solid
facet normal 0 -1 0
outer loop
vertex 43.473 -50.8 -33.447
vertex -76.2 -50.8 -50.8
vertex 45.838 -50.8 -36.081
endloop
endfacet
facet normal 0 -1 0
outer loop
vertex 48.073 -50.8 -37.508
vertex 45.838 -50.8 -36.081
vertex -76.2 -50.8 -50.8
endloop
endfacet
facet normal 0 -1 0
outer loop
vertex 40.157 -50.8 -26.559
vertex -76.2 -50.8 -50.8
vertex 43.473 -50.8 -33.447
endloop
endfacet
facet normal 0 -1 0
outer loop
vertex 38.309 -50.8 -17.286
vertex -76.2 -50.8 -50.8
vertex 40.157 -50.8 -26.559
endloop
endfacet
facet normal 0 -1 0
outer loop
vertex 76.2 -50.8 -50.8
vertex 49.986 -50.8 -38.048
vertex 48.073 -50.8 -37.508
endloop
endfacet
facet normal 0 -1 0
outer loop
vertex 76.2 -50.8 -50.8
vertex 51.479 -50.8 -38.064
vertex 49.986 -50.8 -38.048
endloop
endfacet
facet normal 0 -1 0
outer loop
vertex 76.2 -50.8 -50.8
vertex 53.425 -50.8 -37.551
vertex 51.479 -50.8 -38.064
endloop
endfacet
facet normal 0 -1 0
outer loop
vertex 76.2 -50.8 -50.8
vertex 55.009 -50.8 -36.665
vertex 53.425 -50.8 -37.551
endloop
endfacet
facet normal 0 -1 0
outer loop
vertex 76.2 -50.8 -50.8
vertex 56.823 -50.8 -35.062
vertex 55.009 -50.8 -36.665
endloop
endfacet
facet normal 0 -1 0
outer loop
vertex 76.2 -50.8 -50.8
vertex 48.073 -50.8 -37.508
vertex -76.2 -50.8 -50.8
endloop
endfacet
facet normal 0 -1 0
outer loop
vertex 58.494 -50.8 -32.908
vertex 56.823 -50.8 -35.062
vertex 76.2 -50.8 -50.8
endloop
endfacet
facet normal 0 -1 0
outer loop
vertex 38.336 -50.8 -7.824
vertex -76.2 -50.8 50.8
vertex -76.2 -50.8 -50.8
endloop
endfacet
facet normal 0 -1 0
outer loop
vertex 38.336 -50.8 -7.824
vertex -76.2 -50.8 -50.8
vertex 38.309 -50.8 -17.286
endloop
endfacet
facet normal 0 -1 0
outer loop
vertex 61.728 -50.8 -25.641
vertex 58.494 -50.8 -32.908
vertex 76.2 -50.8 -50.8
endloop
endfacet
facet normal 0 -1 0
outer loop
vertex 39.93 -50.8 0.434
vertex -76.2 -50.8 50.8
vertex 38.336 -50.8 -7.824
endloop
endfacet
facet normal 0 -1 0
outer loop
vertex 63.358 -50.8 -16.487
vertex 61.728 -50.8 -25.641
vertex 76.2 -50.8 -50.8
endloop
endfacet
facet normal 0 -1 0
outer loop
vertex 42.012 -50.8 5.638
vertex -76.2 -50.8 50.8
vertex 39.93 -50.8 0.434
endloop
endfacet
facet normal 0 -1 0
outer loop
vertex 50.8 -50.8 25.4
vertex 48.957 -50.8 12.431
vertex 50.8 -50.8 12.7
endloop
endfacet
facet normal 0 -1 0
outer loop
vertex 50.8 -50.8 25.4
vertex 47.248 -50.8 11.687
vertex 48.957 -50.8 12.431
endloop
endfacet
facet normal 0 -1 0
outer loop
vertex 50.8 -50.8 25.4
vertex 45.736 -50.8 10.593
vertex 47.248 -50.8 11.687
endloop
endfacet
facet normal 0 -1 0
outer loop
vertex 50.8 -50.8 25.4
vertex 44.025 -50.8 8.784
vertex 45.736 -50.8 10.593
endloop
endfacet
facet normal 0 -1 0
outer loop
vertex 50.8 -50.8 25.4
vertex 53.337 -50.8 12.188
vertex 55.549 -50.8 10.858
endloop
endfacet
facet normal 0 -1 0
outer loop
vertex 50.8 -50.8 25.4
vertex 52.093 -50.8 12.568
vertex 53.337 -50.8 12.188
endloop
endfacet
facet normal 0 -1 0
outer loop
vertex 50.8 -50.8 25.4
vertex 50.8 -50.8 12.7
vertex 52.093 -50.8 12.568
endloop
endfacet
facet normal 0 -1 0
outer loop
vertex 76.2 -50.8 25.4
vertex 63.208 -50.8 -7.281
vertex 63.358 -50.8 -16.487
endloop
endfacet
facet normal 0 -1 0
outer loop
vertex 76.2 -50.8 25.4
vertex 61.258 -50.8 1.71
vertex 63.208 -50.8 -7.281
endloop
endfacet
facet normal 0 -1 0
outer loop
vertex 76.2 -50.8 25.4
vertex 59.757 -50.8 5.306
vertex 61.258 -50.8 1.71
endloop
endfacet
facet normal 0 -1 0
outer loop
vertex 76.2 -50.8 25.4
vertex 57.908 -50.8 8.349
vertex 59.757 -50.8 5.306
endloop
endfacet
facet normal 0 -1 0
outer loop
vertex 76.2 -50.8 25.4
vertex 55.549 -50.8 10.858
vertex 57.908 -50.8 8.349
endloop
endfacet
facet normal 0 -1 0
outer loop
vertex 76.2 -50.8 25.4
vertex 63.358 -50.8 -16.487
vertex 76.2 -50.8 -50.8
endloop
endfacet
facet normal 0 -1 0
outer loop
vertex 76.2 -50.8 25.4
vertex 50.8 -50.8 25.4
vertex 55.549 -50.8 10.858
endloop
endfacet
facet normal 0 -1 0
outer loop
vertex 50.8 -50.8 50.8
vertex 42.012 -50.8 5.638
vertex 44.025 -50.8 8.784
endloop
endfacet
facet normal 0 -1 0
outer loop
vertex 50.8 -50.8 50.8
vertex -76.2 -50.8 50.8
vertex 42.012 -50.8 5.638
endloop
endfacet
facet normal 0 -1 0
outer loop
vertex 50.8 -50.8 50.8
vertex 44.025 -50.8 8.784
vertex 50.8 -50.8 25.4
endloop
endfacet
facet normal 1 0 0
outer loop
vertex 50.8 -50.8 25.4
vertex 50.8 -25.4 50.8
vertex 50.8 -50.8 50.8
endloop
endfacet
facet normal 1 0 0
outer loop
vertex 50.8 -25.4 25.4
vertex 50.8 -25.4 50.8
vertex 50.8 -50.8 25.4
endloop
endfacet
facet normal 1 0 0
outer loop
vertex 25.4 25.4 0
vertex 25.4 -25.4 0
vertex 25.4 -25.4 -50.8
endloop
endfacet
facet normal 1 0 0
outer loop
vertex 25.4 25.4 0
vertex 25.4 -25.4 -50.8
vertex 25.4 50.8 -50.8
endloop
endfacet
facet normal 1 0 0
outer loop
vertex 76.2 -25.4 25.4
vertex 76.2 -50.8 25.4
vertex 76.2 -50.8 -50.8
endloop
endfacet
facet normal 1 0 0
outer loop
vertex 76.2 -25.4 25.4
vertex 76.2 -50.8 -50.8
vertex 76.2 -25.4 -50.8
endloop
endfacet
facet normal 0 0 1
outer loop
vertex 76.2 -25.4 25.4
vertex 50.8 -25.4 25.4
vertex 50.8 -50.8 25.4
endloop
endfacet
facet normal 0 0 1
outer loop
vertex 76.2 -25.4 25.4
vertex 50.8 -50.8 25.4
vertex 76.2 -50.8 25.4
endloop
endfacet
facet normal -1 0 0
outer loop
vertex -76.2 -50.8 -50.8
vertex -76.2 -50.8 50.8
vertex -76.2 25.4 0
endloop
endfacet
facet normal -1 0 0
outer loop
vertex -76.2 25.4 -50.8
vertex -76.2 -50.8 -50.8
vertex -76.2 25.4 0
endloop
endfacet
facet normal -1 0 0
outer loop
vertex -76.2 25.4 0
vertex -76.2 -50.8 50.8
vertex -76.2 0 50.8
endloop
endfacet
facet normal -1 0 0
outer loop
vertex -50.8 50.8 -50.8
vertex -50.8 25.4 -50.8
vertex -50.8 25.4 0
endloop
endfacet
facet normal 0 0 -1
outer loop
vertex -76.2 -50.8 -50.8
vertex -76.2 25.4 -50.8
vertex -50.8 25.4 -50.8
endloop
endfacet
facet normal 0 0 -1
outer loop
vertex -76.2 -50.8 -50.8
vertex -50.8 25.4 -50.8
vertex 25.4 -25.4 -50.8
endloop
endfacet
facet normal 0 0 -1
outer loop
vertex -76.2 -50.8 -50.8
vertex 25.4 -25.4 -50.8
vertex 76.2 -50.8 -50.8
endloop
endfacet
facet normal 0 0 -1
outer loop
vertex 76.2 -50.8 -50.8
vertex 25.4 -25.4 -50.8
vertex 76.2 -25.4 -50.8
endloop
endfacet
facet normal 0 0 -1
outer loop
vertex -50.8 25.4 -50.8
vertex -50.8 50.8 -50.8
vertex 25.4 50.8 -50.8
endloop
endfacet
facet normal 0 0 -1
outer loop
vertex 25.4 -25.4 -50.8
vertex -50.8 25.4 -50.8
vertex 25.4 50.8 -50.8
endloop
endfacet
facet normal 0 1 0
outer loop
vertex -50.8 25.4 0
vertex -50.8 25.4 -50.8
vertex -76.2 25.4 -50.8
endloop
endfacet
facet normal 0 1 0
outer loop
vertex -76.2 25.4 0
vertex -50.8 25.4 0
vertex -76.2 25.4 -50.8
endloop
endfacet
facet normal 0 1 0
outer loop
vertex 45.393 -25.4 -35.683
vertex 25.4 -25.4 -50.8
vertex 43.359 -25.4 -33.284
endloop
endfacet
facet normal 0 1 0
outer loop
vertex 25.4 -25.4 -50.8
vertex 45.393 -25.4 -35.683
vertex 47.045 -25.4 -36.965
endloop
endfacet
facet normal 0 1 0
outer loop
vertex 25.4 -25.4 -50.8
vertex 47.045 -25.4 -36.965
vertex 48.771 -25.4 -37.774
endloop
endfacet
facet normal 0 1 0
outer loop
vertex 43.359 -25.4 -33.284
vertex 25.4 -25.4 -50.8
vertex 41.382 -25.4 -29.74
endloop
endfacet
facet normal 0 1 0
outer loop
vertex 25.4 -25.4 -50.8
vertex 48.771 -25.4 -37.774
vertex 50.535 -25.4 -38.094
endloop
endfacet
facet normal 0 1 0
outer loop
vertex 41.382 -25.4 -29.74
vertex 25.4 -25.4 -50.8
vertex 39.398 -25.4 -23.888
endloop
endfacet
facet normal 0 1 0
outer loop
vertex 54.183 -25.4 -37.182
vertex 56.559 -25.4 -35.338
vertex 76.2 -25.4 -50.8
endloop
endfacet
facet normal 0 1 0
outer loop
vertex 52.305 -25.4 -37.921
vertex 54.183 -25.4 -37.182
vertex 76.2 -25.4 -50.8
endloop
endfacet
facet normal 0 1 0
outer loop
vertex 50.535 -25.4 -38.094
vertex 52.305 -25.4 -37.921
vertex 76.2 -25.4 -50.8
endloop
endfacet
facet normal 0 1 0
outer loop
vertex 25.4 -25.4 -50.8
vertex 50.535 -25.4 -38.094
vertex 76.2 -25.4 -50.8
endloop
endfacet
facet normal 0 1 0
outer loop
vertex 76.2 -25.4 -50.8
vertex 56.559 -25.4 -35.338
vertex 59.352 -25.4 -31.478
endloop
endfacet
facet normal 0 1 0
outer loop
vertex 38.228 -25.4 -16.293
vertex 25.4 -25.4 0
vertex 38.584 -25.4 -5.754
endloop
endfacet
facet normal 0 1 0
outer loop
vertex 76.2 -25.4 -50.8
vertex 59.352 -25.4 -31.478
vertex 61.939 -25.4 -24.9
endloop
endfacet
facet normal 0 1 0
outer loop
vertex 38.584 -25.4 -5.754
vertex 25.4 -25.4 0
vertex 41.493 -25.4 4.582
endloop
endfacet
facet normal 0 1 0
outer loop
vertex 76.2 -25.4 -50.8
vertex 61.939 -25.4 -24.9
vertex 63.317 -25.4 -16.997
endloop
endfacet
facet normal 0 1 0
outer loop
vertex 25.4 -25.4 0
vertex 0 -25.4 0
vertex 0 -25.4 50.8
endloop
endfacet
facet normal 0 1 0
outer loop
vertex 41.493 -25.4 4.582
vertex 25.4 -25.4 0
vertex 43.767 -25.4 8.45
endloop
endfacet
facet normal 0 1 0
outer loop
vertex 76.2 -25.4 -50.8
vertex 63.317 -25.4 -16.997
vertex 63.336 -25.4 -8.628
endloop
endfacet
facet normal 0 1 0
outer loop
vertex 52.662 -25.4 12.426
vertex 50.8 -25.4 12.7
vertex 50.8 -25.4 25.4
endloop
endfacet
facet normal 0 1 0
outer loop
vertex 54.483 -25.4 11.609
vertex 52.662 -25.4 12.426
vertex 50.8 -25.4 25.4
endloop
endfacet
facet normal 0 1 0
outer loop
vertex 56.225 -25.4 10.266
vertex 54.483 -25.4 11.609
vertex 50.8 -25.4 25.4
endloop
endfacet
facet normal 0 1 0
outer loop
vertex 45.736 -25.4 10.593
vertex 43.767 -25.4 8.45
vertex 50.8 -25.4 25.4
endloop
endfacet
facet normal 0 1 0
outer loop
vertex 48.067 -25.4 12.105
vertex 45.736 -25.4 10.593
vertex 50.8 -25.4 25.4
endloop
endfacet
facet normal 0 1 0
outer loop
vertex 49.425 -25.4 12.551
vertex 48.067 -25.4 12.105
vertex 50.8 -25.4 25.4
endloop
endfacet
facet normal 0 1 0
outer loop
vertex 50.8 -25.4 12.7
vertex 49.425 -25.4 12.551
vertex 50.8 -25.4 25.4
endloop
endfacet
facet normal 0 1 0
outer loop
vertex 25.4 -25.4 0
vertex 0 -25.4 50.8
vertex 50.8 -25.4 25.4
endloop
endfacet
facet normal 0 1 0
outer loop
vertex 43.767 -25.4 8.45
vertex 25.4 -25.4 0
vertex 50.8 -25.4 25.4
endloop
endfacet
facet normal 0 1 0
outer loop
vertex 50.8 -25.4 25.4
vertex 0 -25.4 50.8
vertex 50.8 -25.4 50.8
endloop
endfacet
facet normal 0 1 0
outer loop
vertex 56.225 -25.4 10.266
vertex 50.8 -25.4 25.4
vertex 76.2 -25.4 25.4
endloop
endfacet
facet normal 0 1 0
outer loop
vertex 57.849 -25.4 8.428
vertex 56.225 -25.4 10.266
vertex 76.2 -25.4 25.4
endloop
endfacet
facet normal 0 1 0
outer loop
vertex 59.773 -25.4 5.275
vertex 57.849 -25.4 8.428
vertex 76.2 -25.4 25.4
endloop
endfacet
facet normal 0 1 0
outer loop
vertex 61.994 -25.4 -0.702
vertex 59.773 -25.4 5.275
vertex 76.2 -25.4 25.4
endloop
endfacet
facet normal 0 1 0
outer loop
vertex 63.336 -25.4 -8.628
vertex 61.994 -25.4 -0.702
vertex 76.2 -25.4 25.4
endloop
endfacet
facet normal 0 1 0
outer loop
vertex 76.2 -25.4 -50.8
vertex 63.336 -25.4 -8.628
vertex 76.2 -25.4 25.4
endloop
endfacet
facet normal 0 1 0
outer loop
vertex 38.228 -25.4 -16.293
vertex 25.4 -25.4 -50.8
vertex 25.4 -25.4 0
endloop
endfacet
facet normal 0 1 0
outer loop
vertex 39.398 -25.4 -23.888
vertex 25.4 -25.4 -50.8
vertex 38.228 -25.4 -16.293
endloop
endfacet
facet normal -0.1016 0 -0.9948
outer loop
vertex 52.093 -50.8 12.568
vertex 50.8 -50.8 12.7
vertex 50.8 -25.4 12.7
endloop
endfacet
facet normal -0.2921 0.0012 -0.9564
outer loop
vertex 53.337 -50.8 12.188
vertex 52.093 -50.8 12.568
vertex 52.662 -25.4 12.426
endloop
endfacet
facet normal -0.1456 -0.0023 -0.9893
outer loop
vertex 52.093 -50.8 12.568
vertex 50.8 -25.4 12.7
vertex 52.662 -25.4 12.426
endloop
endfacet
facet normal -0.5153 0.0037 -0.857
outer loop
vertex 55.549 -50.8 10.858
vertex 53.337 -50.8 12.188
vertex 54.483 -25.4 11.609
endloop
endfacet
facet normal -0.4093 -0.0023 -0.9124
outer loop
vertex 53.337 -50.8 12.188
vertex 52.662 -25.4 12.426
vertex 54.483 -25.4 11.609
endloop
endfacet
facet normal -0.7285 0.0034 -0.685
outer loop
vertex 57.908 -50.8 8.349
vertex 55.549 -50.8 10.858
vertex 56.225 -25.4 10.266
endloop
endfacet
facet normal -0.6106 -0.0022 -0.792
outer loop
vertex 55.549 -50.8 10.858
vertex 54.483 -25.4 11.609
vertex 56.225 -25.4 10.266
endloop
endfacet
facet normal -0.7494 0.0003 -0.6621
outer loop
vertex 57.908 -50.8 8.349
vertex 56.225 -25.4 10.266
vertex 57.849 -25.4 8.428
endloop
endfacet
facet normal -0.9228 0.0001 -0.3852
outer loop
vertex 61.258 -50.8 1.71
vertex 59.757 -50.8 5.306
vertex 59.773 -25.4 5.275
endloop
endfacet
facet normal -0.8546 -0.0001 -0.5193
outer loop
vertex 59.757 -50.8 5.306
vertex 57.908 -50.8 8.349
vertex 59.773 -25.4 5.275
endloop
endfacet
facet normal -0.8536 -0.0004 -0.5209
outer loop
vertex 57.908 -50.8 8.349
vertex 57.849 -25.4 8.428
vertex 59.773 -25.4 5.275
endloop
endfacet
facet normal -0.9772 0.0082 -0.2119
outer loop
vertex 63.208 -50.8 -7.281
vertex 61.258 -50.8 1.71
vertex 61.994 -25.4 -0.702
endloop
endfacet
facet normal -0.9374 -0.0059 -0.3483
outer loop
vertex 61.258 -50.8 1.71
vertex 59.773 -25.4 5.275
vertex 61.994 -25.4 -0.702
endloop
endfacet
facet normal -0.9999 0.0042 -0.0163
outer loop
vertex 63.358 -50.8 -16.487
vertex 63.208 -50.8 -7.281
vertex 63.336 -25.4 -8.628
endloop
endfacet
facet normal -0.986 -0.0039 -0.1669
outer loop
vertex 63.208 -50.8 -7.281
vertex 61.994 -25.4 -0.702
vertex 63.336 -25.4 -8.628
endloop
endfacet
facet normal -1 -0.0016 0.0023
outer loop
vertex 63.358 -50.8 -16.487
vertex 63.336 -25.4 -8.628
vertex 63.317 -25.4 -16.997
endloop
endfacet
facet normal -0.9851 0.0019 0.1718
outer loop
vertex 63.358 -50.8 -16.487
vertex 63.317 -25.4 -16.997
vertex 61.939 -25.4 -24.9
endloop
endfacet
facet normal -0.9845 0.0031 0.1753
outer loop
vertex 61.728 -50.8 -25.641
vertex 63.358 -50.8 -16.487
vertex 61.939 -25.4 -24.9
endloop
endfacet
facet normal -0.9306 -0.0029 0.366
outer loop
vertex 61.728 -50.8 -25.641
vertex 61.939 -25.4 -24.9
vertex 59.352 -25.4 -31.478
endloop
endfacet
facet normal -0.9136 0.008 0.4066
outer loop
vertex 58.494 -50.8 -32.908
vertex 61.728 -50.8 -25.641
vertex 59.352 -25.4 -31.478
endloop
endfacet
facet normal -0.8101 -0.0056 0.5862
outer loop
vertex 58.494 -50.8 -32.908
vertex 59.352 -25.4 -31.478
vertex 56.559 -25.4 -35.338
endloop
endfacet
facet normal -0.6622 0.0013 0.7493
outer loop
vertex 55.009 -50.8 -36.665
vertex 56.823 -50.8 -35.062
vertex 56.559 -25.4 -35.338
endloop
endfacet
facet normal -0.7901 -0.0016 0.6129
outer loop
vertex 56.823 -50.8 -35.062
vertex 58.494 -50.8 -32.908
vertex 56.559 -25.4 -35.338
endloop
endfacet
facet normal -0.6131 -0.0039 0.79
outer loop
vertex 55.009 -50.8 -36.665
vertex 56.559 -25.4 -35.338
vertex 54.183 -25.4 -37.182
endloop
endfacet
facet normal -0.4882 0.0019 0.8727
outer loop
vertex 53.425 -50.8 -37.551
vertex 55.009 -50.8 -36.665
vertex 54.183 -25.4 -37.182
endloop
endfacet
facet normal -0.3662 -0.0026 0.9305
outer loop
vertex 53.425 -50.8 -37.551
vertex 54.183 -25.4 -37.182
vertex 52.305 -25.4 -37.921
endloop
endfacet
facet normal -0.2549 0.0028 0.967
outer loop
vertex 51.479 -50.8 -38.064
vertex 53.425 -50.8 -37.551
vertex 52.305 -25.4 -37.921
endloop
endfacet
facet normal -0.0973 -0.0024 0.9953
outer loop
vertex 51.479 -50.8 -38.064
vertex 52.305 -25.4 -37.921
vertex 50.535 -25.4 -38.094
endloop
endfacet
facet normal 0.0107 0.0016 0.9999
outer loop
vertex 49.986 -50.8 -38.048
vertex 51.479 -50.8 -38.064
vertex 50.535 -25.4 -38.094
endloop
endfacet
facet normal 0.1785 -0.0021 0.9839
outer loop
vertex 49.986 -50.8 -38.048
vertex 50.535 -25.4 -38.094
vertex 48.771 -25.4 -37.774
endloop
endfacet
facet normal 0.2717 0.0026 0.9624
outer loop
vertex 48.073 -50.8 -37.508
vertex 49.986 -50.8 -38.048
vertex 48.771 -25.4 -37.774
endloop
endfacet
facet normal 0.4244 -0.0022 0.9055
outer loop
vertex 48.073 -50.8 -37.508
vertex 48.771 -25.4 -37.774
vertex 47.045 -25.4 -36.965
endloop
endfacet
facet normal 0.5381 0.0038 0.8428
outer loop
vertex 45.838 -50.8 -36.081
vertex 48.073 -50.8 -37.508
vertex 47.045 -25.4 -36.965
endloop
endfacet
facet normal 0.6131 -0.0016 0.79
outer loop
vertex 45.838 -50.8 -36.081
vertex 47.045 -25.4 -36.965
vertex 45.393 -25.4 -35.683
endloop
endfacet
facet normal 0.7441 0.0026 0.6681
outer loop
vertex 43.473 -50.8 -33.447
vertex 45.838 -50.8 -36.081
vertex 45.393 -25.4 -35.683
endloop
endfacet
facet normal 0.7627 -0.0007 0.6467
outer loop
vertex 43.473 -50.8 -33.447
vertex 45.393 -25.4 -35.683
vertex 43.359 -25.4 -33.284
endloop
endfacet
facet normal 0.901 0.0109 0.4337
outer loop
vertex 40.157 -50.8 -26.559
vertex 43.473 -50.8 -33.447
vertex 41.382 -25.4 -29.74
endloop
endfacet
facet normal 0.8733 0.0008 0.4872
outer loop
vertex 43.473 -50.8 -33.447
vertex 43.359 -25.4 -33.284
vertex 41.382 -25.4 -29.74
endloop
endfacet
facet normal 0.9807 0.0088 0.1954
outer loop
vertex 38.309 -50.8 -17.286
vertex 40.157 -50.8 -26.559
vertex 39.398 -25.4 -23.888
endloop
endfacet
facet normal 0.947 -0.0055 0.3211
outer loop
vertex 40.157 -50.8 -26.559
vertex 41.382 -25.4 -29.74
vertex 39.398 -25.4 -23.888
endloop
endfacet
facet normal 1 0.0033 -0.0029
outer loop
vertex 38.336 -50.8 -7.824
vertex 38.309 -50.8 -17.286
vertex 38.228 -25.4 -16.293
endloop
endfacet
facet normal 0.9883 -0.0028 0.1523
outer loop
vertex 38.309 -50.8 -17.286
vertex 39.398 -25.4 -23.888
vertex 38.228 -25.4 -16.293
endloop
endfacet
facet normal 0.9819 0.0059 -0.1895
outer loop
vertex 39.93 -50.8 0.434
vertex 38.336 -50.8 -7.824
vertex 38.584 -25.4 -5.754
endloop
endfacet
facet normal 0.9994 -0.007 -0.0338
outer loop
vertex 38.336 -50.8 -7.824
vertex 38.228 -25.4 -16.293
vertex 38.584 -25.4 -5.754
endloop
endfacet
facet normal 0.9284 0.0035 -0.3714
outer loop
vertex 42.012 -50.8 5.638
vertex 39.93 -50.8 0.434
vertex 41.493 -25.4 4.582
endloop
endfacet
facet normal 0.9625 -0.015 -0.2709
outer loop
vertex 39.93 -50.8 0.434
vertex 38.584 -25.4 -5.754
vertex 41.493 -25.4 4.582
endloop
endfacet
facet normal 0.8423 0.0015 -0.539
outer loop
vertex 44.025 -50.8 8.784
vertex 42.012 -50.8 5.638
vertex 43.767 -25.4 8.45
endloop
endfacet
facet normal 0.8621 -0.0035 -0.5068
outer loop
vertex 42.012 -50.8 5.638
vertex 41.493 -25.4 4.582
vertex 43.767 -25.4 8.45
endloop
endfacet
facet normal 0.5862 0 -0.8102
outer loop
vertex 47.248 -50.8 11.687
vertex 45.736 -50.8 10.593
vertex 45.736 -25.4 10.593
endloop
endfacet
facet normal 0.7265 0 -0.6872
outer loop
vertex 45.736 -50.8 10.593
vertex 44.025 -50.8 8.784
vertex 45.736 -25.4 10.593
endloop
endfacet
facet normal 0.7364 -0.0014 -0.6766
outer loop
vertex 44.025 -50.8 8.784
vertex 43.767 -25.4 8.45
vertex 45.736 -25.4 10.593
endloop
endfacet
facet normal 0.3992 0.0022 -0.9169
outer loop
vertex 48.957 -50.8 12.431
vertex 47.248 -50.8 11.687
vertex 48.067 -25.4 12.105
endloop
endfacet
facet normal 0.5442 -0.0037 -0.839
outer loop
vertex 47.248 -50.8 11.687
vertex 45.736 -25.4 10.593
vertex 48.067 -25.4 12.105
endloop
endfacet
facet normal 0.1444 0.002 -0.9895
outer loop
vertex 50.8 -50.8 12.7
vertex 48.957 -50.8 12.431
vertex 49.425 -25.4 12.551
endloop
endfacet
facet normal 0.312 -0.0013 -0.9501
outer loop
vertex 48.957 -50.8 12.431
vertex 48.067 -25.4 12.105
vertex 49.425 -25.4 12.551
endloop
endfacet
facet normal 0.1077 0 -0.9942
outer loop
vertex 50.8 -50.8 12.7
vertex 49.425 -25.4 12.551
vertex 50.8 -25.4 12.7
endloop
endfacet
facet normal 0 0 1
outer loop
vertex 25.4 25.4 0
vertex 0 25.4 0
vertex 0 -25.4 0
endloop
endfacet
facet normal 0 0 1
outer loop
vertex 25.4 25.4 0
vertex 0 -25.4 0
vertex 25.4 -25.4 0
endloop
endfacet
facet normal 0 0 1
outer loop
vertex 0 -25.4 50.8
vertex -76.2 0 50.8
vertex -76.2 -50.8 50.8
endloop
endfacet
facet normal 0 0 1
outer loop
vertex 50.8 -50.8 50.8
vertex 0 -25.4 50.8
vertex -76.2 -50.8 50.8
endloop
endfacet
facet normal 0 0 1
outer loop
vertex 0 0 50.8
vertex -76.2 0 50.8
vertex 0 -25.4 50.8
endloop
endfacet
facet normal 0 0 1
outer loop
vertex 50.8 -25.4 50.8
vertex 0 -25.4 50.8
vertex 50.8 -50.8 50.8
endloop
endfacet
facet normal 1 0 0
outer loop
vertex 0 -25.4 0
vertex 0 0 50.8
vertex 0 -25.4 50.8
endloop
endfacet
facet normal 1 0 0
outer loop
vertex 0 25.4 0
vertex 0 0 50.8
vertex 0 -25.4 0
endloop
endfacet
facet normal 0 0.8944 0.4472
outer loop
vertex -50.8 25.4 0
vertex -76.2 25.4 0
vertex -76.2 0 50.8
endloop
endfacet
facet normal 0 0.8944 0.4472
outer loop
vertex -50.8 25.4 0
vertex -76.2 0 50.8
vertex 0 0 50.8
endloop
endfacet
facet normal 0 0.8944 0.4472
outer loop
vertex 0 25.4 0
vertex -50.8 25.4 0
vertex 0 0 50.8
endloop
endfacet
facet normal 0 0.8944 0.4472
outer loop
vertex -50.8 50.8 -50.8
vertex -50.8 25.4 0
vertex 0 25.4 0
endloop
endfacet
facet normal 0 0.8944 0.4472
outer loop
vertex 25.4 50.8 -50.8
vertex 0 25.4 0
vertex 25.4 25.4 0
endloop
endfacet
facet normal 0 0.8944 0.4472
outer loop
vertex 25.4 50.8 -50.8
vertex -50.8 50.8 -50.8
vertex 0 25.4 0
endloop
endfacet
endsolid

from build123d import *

# Parameters (mm, degrees)
SKETCH2_W           = 152.4
SKETCH2_H           = 101.6
BOSS_EXTRUDE1_DEPTH = 50.8
SKETCH3_W           = 50.8
SKETCH3_H           = 76.2
CUT_EXTRUDE1_DEPTH  = 137.783186101
SKETCH4_W           = 25.4
SKETCH4_H           = 25.4
CUT_EXTRUDE2_DEPTH  = 120.1365603
SKETCH5_W           = 25.4
SKETCH5_H           = 50.8
CUT_EXTRUDE3_DEPTH  = 76.2
SKETCH6_W           = 25.4
SKETCH6_H           = 25.4
CUT_EXTRUDE4_DEPTH  = 137.783186101
CHAMFER1_SIZE2      = 101.6
CHAMFER1_SIZE       = 50.8
SKETCH7_RX          = 25.4
SKETCH7_RY          = 12.7
CUT_EXTRUDE5_DEPTH  = 120.1365603


with BuildPart() as part:
    # Sketch2 → Boss-Extrude1 (new, symmetric)
    with BuildSketch(Plane.XY):
        Rectangle(SKETCH2_W, SKETCH2_H)
    extrude(amount=BOSS_EXTRUDE1_DEPTH, both=True)

    # Sketch3 → Cut-Extrude1 (cut, through all)
    with BuildSketch(Plane.XY.offset(50.8)):
        with Locations((50.8, 12.7)):
            Rectangle(SKETCH3_W, SKETCH3_H)
    extrude(amount=-CUT_EXTRUDE1_DEPTH, mode=Mode.SUBTRACT)

    # Sketch4 → Cut-Extrude2 (cut, through all)
    with BuildSketch(Plane(origin=(0, -25.4, 0), x_dir=(1, 0, 0), z_dir=(0, 1, 0))):
        with Locations((63.5, -38.1)):
            Rectangle(SKETCH4_W, SKETCH4_H)
    extrude(amount=-CUT_EXTRUDE2_DEPTH, mode=Mode.SUBTRACT)

    # Sketch5 → Cut-Extrude3 (cut)
    with BuildSketch(Plane(origin=(0, 50.8, 0), x_dir=(1, 0, 0), z_dir=(0, 1, 0))):
        with Locations((12.7, -25.4)):
            Rectangle(SKETCH5_W, SKETCH5_H)
    extrude(amount=-CUT_EXTRUDE3_DEPTH, mode=Mode.SUBTRACT)

    # Sketch6 → Cut-Extrude4 (cut, through all)
    with BuildSketch(Plane(origin=(0, 0, -50.8), x_dir=(-1, 0, 0), z_dir=(0, 0, -1))):
        with Locations((63.5, 38.1)):
            Rectangle(SKETCH6_W, SKETCH6_H)
    extrude(amount=-CUT_EXTRUDE4_DEPTH, mode=Mode.SUBTRACT)

    # Chamfer1
    chamfer1_edges = [part.edges().sort_by_distance(p)[0] for p in [
        (-25.4, 50.8, 50.8),
    ]]
    chamfer1_side = [part.faces().sort_by_distance(p)[0] for p in [
        (-25.4, 49.784, 50.8),
    ]]
    chamfer(chamfer1_edges, length=CHAMFER1_SIZE - 0.0001, length2=CHAMFER1_SIZE2 - 0.0001, reference=chamfer1_side[0])  # a hair under: the kernel refuses the full size

    # Sketch7 → Cut-Extrude5 (cut, through all)
    with BuildSketch(Plane(origin=(0, -25.4, 0), x_dir=(1, 0, 0), z_dir=(0, 1, 0))):
        with Locations(Location((50.8, 12.7), (0, 0, -90))):
            Ellipse(SKETCH7_RX, SKETCH7_RY)
    extrude(amount=-CUT_EXTRUDE5_DEPTH, mode=Mode.SUBTRACT)


solid = part.part
